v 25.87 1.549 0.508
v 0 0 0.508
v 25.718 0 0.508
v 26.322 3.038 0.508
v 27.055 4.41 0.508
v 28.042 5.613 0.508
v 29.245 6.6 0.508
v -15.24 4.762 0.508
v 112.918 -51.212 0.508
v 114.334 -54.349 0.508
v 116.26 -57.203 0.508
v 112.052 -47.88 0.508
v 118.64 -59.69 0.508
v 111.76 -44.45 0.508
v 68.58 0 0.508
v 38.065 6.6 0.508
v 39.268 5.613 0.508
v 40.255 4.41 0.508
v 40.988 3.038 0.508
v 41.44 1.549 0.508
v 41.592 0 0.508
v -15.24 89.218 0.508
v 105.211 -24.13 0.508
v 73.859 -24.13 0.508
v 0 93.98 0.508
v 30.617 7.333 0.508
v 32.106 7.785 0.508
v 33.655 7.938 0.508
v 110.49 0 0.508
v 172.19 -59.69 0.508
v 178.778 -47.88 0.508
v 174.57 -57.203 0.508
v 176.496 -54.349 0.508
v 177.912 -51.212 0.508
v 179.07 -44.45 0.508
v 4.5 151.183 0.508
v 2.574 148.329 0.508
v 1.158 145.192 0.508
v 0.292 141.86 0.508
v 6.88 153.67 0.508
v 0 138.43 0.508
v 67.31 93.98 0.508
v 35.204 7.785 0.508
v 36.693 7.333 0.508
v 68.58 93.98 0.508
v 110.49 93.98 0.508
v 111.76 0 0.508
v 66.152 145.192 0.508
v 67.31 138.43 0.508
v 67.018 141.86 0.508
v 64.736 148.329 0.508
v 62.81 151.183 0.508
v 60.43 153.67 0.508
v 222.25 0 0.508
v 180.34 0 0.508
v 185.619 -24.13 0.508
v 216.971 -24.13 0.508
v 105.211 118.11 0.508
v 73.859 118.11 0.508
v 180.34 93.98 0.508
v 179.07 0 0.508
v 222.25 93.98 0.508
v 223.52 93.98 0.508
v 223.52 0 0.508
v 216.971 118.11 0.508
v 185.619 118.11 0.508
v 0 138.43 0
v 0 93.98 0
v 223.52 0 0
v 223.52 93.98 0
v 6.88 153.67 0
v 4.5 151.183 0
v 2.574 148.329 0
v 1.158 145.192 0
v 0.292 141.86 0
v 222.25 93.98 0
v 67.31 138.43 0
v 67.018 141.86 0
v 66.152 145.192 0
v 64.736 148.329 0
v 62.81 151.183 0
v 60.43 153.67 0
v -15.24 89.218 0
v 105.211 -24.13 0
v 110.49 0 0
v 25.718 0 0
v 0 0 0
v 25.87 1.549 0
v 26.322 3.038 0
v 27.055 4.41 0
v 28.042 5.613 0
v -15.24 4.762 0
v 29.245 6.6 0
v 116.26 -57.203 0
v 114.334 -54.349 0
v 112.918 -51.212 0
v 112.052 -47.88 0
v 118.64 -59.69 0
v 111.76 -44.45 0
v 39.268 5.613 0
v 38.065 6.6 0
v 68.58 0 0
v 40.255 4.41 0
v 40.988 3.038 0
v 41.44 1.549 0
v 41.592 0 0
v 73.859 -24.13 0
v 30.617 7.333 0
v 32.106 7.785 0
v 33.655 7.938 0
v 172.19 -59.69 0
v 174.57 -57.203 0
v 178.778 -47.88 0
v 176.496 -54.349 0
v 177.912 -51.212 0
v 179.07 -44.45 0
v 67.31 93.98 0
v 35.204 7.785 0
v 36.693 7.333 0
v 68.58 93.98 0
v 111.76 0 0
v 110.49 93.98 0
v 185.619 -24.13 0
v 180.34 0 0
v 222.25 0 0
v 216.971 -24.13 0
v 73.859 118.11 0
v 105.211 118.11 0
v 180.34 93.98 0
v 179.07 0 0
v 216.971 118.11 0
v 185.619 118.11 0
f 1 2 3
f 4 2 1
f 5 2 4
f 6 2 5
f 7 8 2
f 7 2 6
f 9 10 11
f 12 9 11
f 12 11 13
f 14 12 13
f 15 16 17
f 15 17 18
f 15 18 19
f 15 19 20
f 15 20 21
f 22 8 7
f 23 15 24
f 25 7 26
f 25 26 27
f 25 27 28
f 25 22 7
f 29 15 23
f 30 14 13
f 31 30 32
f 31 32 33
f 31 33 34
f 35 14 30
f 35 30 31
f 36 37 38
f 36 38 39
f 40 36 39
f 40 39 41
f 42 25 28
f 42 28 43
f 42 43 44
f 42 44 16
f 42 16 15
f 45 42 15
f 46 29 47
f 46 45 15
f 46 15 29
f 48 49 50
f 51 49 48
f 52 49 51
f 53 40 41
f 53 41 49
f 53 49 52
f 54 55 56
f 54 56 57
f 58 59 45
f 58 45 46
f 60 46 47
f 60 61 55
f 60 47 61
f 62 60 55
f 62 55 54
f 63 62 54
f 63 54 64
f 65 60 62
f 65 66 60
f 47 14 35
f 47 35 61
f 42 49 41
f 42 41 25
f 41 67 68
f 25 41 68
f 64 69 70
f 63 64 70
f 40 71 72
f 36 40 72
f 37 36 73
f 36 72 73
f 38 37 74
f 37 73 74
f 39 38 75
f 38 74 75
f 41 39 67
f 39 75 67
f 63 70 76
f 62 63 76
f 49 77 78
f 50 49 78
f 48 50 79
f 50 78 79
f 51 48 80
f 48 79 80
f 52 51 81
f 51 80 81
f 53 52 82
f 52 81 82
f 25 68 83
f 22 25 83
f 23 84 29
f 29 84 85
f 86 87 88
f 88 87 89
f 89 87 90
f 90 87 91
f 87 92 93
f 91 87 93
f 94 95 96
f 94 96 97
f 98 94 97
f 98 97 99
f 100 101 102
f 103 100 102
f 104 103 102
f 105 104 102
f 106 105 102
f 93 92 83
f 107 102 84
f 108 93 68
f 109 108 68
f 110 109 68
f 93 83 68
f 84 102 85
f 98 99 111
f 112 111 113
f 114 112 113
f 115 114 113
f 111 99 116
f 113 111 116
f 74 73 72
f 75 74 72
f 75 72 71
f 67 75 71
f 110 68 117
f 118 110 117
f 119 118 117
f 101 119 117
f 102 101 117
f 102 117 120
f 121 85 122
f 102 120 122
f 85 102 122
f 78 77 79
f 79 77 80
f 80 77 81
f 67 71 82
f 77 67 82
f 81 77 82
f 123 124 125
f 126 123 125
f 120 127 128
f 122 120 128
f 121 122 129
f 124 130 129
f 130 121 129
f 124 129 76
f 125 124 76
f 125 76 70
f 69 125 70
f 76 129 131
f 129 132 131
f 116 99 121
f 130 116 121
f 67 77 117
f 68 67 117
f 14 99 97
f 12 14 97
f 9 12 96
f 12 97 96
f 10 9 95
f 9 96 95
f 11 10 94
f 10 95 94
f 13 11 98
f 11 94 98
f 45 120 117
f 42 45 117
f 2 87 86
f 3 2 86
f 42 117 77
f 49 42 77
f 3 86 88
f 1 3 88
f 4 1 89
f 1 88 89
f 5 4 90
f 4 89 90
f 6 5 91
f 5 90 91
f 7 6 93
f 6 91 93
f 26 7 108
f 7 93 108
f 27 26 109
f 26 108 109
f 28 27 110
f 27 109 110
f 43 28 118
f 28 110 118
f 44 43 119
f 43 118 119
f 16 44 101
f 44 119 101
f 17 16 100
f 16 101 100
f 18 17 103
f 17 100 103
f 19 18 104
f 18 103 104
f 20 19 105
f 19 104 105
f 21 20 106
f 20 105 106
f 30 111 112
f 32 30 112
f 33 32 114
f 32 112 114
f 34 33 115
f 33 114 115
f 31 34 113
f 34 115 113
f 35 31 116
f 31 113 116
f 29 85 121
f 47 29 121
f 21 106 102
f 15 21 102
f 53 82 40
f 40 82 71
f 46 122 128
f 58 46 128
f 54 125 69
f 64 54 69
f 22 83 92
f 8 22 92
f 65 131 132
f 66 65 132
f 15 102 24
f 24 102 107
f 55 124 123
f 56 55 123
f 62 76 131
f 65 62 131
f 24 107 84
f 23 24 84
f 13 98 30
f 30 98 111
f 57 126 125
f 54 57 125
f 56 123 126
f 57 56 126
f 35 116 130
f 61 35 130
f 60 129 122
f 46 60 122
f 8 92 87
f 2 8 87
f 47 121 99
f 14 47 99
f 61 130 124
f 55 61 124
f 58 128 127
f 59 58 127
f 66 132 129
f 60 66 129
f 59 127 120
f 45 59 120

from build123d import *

# Parameters (mm, degrees)
F1_DEPTH = 0.508


with BuildPart() as f1:
    # F0 (on Top) → F1 (new body)
    with BuildSketch(Plane.XY):
        with BuildLine():
            Line((-15.24, 4.7625), (0, 0))
            Line((0, 0), (25.7175, 0))
            ThreePointArc((25.7175, 0), (33.655, 7.9375), (41.5925, 0))
            Line((41.5925, 0), (67.31, 0))
            Line((67.31, 0), (68.58, 0))
            Line((68.58, 0), (73.858835, -24.13))
            Line((73.858835, -24.13), (105.211165, -24.13))
            Line((105.211165, -24.13), (110.49, 0))
            Line((110.49, 0), (111.76, 0))
            Line((111.76, 0), (111.76, -44.45))
            ThreePointArc((111.76, -44.45), (113.559583, -52.810417), (118.639583, -59.69))
            Line((118.639583, -59.69), (172.190417, -59.69))
            ThreePointArc((172.190417, -59.69), (177.270417, -52.810417), (179.07, -44.45))
            Line((179.07, -44.45), (179.07, 0))
            Line((179.07, 0), (180.34, 0))
            Line((180.34, 0), (185.618835, -24.13))
            Line((185.618835, -24.13), (216.971165, -24.13))
            Line((216.971165, -24.13), (222.25, 0))
            Line((222.25, 0), (223.52, 0))
            Line((223.52, 0), (223.52, 93.98))
            Line((223.52, 93.98), (222.25, 93.98))
            Line((222.25, 93.98), (216.971165, 118.11))
            Line((216.971165, 118.11), (185.618835, 118.11))
            Line((185.618835, 118.11), (180.34, 93.98))
            Line((180.34, 93.98), (179.07, 93.98))
            Line((179.07, 93.98), (111.76, 93.98))
            Line((111.76, 93.98), (110.49, 93.98))
            Line((110.49, 93.98), (105.211165, 118.11))
            Line((105.211165, 118.11), (73.858835, 118.11))
            Line((73.858835, 118.11), (68.58, 93.98))
            Line((68.58, 93.98), (67.31, 93.98))
            Line((67.31, 93.98), (67.31, 138.43))
            ThreePointArc((67.31, 138.43), (65.510417, 146.790417), (60.430417, 153.67))
            Line((60.430417, 153.67), (33.655, 153.67))
            Line((33.655, 153.67), (6.879583, 153.67))
            ThreePointArc((6.879583, 153.67), (1.799583, 146.790417), (0, 138.43))
            Line((0, 138.43), (0, 93.98))
            Line((0, 93.98), (-15.24, 89.2175))
            Line((-15.24, 89.2175), (-15.24, 46.99))
            Line((-15.24, 46.99), (-15.24, 4.7625))
        make_face()
    extrude(amount=F1_DEPTH)


solid = f1.part
